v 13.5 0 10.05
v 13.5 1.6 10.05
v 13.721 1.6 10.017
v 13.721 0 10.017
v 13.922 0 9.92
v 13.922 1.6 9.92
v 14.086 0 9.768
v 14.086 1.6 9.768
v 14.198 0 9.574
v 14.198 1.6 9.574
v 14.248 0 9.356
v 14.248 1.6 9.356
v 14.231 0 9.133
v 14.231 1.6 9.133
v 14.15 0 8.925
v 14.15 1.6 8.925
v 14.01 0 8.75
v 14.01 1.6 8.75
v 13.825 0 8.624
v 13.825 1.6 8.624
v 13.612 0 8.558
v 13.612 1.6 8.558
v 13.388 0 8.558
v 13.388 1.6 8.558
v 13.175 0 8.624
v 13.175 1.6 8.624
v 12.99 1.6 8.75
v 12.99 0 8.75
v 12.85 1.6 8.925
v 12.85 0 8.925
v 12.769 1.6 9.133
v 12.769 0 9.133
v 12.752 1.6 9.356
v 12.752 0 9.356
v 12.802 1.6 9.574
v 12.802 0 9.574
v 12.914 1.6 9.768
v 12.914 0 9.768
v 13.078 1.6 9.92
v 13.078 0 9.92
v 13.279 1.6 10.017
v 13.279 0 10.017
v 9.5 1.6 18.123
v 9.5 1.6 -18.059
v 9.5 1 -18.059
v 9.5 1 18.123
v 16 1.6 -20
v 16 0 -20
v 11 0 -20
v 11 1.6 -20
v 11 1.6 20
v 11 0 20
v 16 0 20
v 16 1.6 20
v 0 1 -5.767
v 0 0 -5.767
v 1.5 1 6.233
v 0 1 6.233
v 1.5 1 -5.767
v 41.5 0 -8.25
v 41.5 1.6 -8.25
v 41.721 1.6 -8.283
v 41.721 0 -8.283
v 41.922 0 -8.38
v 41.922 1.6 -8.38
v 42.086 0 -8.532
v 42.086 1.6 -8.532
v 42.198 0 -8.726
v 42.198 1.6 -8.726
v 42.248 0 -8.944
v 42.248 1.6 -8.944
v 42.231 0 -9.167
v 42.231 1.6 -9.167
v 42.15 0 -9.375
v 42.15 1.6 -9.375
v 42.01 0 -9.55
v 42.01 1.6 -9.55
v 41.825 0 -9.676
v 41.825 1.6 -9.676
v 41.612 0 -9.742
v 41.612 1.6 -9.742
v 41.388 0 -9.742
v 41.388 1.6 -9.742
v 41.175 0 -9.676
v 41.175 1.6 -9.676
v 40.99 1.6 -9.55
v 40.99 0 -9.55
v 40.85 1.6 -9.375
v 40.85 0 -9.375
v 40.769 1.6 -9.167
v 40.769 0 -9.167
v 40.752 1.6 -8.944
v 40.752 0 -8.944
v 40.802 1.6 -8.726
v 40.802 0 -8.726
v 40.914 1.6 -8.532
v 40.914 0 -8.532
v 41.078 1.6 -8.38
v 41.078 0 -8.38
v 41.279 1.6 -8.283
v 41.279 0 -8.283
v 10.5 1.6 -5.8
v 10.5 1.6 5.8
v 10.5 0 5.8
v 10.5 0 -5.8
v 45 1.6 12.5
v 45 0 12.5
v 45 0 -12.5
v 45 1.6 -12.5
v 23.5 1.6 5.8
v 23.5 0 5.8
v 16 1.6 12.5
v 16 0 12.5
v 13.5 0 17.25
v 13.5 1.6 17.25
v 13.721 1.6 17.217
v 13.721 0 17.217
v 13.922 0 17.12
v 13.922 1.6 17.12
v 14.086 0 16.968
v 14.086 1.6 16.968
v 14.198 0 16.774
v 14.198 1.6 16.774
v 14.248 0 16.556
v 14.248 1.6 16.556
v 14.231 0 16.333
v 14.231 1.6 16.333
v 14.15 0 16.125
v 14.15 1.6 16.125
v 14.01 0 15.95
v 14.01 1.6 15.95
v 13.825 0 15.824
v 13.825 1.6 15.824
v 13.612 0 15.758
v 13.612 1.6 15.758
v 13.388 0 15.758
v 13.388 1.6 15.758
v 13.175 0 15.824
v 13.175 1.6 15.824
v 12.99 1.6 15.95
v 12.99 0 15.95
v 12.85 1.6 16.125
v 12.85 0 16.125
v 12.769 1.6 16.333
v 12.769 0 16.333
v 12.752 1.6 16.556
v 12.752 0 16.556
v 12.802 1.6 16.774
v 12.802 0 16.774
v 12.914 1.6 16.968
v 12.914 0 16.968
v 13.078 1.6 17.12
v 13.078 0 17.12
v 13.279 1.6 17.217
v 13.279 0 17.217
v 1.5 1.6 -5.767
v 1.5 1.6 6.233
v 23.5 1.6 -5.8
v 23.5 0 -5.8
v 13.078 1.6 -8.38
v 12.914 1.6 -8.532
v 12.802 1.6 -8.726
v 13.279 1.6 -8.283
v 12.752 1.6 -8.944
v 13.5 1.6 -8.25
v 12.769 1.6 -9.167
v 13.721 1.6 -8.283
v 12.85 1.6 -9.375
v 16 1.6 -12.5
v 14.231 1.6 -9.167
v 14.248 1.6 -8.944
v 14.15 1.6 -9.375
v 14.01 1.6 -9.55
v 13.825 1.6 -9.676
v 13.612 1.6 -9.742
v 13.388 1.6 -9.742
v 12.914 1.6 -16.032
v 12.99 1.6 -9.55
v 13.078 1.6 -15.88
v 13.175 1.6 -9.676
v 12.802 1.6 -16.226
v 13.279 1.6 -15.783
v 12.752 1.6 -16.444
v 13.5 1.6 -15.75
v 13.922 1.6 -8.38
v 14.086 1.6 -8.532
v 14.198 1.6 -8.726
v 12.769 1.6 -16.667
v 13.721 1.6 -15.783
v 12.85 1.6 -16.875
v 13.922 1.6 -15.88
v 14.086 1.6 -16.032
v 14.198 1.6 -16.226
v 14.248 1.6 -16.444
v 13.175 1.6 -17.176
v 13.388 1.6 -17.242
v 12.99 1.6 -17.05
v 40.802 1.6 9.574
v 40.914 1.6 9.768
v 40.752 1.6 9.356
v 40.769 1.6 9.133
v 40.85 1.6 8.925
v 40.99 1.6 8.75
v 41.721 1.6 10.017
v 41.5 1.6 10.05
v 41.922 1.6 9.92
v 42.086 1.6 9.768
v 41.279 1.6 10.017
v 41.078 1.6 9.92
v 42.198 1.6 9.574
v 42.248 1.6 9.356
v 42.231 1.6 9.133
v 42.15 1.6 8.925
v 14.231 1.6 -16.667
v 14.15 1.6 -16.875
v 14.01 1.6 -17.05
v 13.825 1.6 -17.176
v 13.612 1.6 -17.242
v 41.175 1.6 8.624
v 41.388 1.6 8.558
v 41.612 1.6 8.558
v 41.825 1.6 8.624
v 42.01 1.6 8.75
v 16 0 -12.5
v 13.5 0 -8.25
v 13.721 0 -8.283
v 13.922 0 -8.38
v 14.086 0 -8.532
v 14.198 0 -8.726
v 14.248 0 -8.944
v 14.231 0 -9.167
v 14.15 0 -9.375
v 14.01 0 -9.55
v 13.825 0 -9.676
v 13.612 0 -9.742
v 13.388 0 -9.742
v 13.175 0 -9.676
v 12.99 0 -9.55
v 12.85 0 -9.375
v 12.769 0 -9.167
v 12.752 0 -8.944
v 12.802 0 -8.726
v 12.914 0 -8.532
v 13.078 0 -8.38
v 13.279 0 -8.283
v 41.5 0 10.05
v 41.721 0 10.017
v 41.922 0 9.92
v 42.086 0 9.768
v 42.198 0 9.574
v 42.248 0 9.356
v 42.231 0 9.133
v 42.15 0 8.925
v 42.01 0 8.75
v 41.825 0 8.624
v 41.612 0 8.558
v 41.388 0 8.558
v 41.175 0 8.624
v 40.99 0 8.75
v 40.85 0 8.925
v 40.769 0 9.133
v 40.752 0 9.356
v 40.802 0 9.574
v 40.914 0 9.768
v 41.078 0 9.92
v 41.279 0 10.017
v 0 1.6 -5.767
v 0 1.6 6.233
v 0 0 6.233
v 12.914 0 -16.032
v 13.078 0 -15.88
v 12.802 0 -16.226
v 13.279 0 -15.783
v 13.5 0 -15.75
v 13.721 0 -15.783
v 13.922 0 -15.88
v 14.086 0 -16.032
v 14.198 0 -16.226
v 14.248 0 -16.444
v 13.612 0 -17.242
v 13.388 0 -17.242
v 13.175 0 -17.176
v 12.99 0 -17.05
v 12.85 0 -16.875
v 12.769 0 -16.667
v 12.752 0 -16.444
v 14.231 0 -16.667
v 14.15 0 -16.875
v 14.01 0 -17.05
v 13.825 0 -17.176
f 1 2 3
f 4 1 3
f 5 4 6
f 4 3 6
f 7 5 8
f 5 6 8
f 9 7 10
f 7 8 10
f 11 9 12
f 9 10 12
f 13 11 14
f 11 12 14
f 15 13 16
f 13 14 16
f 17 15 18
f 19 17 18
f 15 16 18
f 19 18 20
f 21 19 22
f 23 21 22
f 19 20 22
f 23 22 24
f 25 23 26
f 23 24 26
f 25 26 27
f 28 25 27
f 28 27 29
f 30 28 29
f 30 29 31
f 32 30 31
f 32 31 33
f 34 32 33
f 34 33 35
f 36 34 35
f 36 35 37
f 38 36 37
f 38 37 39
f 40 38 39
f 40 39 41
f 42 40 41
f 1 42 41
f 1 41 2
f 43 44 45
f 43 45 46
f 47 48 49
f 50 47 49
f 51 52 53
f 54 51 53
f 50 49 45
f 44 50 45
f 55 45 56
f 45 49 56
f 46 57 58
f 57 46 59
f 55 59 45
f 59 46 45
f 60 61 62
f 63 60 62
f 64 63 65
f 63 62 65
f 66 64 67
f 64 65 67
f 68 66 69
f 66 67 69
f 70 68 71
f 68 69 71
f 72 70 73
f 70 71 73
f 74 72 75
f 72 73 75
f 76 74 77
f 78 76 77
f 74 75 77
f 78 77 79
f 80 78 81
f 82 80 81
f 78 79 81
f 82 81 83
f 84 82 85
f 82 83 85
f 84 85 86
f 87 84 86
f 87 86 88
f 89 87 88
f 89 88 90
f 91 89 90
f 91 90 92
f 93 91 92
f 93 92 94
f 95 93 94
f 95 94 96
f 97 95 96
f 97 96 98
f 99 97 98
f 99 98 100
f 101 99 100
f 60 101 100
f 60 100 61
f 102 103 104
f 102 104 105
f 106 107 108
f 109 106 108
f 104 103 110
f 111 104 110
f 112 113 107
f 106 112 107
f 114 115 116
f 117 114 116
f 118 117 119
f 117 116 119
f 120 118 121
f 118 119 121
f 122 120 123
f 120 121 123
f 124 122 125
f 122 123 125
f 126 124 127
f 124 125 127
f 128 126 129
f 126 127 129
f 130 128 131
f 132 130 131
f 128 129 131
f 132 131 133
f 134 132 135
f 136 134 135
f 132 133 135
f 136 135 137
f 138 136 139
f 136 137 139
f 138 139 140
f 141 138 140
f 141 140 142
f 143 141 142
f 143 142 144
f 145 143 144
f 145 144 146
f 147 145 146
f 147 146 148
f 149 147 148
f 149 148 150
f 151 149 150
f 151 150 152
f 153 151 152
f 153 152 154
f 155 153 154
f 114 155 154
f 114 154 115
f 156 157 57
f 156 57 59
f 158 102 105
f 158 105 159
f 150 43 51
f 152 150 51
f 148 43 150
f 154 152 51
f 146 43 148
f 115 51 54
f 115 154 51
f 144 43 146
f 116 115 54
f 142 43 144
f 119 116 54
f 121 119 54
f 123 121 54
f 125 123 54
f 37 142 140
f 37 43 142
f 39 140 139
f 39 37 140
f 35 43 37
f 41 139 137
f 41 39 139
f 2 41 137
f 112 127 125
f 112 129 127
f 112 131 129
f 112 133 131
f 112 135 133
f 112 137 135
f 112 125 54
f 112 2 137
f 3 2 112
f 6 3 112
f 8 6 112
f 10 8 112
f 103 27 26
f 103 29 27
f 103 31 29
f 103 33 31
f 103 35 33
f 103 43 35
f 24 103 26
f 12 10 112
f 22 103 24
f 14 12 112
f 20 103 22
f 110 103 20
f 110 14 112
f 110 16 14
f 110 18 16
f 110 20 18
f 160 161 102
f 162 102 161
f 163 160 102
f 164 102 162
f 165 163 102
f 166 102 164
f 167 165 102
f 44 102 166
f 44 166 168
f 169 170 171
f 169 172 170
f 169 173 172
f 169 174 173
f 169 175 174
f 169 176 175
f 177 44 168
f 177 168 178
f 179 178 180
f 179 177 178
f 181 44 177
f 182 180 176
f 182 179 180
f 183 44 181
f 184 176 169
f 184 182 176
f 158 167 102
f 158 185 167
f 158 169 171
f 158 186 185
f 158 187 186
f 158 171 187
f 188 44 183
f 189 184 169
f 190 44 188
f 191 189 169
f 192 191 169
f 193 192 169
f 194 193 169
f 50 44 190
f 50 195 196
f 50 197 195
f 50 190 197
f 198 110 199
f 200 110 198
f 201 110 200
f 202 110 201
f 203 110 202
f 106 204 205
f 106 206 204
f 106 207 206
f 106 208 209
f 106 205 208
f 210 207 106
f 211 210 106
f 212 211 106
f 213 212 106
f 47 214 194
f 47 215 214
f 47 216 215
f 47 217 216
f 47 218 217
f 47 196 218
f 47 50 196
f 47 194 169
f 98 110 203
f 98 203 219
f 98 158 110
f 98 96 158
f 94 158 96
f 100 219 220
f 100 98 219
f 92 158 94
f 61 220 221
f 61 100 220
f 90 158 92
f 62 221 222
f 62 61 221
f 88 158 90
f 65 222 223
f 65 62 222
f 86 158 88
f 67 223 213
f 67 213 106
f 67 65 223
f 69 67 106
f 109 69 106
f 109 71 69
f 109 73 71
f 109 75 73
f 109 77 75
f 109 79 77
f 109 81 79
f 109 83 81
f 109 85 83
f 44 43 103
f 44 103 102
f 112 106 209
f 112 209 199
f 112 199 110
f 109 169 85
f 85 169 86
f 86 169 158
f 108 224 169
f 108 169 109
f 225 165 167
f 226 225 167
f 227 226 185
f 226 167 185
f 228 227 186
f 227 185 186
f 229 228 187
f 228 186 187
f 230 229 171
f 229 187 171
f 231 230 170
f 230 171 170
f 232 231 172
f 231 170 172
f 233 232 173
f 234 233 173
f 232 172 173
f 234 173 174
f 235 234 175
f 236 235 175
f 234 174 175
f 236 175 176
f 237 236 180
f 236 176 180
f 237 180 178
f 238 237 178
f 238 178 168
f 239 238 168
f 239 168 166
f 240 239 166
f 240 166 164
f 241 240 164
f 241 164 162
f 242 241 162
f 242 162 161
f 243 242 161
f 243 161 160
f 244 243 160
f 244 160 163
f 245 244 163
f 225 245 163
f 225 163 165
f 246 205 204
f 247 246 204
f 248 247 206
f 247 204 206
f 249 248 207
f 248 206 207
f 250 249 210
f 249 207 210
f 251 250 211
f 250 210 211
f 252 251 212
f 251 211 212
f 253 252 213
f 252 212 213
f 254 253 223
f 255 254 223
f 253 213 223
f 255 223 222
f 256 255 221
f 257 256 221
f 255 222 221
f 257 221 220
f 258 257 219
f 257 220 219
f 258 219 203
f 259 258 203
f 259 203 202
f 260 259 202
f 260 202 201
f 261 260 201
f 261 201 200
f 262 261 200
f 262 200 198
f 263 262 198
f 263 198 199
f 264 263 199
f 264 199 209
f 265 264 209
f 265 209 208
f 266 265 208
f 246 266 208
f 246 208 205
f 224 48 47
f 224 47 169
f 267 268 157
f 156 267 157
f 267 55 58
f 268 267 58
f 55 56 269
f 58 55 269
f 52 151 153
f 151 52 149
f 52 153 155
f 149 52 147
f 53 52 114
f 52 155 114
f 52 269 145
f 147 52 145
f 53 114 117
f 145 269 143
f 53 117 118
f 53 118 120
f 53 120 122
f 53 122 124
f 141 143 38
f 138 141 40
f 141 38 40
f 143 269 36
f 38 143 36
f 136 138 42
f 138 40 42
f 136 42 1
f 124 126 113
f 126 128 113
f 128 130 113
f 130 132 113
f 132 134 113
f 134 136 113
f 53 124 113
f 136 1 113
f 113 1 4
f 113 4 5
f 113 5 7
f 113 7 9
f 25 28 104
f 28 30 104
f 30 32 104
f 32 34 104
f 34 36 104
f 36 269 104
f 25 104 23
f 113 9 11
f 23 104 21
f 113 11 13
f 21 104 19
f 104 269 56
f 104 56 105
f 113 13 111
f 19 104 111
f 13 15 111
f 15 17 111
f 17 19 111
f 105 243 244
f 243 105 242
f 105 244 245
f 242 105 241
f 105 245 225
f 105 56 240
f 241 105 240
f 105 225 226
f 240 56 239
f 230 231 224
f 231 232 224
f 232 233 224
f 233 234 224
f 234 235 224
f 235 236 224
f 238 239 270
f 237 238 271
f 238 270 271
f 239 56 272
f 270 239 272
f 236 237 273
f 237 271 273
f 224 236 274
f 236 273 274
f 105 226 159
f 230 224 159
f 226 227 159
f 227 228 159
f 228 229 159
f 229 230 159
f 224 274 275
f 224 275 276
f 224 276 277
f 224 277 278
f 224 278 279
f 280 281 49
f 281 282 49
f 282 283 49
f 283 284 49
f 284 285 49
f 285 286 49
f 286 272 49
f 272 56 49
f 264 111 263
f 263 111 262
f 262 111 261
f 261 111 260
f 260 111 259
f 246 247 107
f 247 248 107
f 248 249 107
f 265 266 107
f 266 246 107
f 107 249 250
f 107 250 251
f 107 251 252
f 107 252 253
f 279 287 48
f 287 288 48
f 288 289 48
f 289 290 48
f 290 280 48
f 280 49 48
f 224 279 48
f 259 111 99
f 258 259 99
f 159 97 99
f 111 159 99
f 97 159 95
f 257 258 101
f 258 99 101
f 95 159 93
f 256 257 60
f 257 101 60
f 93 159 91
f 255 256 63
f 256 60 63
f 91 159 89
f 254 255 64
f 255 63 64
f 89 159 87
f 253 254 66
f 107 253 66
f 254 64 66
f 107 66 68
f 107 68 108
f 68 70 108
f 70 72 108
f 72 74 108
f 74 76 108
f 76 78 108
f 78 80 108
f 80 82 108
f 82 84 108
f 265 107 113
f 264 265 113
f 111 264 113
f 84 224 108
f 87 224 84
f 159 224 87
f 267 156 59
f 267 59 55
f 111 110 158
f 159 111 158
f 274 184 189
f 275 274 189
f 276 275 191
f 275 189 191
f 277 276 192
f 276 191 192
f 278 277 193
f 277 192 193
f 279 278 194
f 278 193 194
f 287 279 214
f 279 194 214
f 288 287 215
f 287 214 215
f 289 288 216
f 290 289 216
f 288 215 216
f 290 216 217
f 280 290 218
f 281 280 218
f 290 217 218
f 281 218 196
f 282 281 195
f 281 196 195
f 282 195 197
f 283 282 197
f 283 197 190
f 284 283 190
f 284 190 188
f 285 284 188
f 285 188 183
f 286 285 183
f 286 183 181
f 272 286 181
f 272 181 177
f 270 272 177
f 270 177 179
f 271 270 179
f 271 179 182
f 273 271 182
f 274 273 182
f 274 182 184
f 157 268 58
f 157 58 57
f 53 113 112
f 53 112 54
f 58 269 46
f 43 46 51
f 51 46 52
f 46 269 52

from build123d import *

# Parameters (mm, degrees)
BOSS_EXTRUDE1_DEPTH = 11.6
CUT_EXTRUDE1_DEPTH  = 9.85
SKETCH5_W           = 13
SKETCH5_H           = 11.6
CUT_EXTRUDE3_DEPTH  = 51.592094244
CUT_EXTRUDE5_DEPTH  = 9.85
SKETCH9_W           = 29
SKETCH9_H           = 7.5
CUT_EXTRUDE7_DEPTH  = 51.592094244
SKETCH10_R          = 0.75
CUT_EXTRUDE8_DEPTH  = 51.592094244
SKETCH11_W          = 1.5
SKETCH11_H          = 12
CUT_EXTRUDE9_DEPTH  = 10
CUT_EXTRUDE10_DEPTH = 0.75


with BuildPart() as part:
    # Sketch2 → Boss-Extrude1 (new body)
    with BuildSketch(Plane(origin=(0, 0, 0), x_dir=(1, 0, 0), z_dir=(0, 1, 0))):
        Polygon((0, 5.767018283), (0, -6.232981717), (11, -20), (45, -20), (45, 20), (11, 20), align=None)
    extrude(amount=BOSS_EXTRUDE1_DEPTH)

    # Sketch3 → Cut-Extrude1 (cut)
    with BuildSketch(Plane(origin=(0, 11.6, 0), x_dir=(1, 0, 0), z_dir=(0, 1, 0))):
        Polygon((1.5, 7.707879426), (1.5, -8.110302392), (9.5, -18.122679325), (9.5, 18.059138857), align=None)
    extrude(amount=-CUT_EXTRUDE1_DEPTH, mode=Mode.SUBTRACT)

    # Sketch5 → Cut-Extrude3 (cut, through all)
    with BuildSketch(Plane(origin=(0, 11.6, 0), x_dir=(1, 0, 0), z_dir=(0, 1, 0))):
        with Locations((17, 0)):
            Rectangle(SKETCH5_W, SKETCH5_H)
    extrude(amount=-CUT_EXTRUDE3_DEPTH, mode=Mode.SUBTRACT)

    # Sketch7 → Cut-Extrude5 (cut)
    with BuildSketch(Plane(origin=(0, 11.6, 0), x_dir=(1, 0, 0), z_dir=(0, 1, 0))):
        Polygon((1.5, 7.707879426), (0, 5.767018283), (1.5, 5.767018283), align=None)
        Polygon((0, -6.232981717), (1.5, -6.232981717), (1.5, -8.110302392), align=None)
    extrude(amount=-CUT_EXTRUDE5_DEPTH, mode=Mode.SUBTRACT)

    # Sketch9 → Cut-Extrude7 (cut, through all)
    with BuildSketch(Plane.XZ):
        with Locations((30.5, 16.25)):
            Rectangle(SKETCH9_W, SKETCH9_H)
        with Locations((30.5, -16.25)):
            Rectangle(SKETCH9_W, SKETCH9_H)
    extrude(amount=-CUT_EXTRUDE7_DEPTH, mode=Mode.SUBTRACT)

    # Sketch10 → Cut-Extrude8 (cut, through all)
    with BuildSketch(Plane(origin=(0, 11.6, 0), x_dir=(1, 0, 0), z_dir=(0, 1, 0))):
        with Locations(Location((13.5, 16.5, 0), (0, 0, 270))):
            Circle(SKETCH10_R)
        with Locations(Location((13.5, 9, 0), (0, 0, 270))):
            Circle(SKETCH10_R)
        with Locations(Location((41.5, 9, 0), (0, 0, 270))):
            Circle(SKETCH10_R)
        with Locations(Location((41.5, -9.3, 0), (0, 0, 270))):
            Circle(SKETCH10_R)
        with Locations(Location((13.5, -9.3, 0), (0, 0, 270))):
            Circle(SKETCH10_R)
        with Locations(Location((13.5, -16.5, 0), (0, 0, 270))):
            Circle(SKETCH10_R)
    extrude(amount=-CUT_EXTRUDE8_DEPTH, mode=Mode.SUBTRACT)

    # Sketch11 → Cut-Extrude9 (cut)
    with BuildSketch(Plane(origin=(0, 11.6, 0), x_dir=(1, 0, 0), z_dir=(0, 1, 0))):
        Polygon((9.5, 18.059138857), (9.5, -18.122679325), (11, -20), (16, -20), (16, -12.5), (45, -12.5), (45, 12.5), (16, 12.5), (16, 20), (11, 20), align=None)
        with Locations((0.75, -0.232981717)):
            Rectangle(SKETCH11_W, SKETCH11_H)
    extrude(amount=-CUT_EXTRUDE9_DEPTH, mode=Mode.SUBTRACT)

    # Sketch12 → Cut-Extrude10 (cut)
    with BuildSketch(Plane(origin=(0, 1.75, 0), x_dir=(1, 0, 0), z_dir=(0, 1, 0))):
        Polygon((0, 5.767018283), (9.5, 18.059138857), (9.5, -18.122679325), (0, -6.232981717), (1.5, -6.232981717), (1.5, 5.767018283), align=None)
    extrude(amount=-CUT_EXTRUDE10_DEPTH, mode=Mode.SUBTRACT)


solid = part.part
